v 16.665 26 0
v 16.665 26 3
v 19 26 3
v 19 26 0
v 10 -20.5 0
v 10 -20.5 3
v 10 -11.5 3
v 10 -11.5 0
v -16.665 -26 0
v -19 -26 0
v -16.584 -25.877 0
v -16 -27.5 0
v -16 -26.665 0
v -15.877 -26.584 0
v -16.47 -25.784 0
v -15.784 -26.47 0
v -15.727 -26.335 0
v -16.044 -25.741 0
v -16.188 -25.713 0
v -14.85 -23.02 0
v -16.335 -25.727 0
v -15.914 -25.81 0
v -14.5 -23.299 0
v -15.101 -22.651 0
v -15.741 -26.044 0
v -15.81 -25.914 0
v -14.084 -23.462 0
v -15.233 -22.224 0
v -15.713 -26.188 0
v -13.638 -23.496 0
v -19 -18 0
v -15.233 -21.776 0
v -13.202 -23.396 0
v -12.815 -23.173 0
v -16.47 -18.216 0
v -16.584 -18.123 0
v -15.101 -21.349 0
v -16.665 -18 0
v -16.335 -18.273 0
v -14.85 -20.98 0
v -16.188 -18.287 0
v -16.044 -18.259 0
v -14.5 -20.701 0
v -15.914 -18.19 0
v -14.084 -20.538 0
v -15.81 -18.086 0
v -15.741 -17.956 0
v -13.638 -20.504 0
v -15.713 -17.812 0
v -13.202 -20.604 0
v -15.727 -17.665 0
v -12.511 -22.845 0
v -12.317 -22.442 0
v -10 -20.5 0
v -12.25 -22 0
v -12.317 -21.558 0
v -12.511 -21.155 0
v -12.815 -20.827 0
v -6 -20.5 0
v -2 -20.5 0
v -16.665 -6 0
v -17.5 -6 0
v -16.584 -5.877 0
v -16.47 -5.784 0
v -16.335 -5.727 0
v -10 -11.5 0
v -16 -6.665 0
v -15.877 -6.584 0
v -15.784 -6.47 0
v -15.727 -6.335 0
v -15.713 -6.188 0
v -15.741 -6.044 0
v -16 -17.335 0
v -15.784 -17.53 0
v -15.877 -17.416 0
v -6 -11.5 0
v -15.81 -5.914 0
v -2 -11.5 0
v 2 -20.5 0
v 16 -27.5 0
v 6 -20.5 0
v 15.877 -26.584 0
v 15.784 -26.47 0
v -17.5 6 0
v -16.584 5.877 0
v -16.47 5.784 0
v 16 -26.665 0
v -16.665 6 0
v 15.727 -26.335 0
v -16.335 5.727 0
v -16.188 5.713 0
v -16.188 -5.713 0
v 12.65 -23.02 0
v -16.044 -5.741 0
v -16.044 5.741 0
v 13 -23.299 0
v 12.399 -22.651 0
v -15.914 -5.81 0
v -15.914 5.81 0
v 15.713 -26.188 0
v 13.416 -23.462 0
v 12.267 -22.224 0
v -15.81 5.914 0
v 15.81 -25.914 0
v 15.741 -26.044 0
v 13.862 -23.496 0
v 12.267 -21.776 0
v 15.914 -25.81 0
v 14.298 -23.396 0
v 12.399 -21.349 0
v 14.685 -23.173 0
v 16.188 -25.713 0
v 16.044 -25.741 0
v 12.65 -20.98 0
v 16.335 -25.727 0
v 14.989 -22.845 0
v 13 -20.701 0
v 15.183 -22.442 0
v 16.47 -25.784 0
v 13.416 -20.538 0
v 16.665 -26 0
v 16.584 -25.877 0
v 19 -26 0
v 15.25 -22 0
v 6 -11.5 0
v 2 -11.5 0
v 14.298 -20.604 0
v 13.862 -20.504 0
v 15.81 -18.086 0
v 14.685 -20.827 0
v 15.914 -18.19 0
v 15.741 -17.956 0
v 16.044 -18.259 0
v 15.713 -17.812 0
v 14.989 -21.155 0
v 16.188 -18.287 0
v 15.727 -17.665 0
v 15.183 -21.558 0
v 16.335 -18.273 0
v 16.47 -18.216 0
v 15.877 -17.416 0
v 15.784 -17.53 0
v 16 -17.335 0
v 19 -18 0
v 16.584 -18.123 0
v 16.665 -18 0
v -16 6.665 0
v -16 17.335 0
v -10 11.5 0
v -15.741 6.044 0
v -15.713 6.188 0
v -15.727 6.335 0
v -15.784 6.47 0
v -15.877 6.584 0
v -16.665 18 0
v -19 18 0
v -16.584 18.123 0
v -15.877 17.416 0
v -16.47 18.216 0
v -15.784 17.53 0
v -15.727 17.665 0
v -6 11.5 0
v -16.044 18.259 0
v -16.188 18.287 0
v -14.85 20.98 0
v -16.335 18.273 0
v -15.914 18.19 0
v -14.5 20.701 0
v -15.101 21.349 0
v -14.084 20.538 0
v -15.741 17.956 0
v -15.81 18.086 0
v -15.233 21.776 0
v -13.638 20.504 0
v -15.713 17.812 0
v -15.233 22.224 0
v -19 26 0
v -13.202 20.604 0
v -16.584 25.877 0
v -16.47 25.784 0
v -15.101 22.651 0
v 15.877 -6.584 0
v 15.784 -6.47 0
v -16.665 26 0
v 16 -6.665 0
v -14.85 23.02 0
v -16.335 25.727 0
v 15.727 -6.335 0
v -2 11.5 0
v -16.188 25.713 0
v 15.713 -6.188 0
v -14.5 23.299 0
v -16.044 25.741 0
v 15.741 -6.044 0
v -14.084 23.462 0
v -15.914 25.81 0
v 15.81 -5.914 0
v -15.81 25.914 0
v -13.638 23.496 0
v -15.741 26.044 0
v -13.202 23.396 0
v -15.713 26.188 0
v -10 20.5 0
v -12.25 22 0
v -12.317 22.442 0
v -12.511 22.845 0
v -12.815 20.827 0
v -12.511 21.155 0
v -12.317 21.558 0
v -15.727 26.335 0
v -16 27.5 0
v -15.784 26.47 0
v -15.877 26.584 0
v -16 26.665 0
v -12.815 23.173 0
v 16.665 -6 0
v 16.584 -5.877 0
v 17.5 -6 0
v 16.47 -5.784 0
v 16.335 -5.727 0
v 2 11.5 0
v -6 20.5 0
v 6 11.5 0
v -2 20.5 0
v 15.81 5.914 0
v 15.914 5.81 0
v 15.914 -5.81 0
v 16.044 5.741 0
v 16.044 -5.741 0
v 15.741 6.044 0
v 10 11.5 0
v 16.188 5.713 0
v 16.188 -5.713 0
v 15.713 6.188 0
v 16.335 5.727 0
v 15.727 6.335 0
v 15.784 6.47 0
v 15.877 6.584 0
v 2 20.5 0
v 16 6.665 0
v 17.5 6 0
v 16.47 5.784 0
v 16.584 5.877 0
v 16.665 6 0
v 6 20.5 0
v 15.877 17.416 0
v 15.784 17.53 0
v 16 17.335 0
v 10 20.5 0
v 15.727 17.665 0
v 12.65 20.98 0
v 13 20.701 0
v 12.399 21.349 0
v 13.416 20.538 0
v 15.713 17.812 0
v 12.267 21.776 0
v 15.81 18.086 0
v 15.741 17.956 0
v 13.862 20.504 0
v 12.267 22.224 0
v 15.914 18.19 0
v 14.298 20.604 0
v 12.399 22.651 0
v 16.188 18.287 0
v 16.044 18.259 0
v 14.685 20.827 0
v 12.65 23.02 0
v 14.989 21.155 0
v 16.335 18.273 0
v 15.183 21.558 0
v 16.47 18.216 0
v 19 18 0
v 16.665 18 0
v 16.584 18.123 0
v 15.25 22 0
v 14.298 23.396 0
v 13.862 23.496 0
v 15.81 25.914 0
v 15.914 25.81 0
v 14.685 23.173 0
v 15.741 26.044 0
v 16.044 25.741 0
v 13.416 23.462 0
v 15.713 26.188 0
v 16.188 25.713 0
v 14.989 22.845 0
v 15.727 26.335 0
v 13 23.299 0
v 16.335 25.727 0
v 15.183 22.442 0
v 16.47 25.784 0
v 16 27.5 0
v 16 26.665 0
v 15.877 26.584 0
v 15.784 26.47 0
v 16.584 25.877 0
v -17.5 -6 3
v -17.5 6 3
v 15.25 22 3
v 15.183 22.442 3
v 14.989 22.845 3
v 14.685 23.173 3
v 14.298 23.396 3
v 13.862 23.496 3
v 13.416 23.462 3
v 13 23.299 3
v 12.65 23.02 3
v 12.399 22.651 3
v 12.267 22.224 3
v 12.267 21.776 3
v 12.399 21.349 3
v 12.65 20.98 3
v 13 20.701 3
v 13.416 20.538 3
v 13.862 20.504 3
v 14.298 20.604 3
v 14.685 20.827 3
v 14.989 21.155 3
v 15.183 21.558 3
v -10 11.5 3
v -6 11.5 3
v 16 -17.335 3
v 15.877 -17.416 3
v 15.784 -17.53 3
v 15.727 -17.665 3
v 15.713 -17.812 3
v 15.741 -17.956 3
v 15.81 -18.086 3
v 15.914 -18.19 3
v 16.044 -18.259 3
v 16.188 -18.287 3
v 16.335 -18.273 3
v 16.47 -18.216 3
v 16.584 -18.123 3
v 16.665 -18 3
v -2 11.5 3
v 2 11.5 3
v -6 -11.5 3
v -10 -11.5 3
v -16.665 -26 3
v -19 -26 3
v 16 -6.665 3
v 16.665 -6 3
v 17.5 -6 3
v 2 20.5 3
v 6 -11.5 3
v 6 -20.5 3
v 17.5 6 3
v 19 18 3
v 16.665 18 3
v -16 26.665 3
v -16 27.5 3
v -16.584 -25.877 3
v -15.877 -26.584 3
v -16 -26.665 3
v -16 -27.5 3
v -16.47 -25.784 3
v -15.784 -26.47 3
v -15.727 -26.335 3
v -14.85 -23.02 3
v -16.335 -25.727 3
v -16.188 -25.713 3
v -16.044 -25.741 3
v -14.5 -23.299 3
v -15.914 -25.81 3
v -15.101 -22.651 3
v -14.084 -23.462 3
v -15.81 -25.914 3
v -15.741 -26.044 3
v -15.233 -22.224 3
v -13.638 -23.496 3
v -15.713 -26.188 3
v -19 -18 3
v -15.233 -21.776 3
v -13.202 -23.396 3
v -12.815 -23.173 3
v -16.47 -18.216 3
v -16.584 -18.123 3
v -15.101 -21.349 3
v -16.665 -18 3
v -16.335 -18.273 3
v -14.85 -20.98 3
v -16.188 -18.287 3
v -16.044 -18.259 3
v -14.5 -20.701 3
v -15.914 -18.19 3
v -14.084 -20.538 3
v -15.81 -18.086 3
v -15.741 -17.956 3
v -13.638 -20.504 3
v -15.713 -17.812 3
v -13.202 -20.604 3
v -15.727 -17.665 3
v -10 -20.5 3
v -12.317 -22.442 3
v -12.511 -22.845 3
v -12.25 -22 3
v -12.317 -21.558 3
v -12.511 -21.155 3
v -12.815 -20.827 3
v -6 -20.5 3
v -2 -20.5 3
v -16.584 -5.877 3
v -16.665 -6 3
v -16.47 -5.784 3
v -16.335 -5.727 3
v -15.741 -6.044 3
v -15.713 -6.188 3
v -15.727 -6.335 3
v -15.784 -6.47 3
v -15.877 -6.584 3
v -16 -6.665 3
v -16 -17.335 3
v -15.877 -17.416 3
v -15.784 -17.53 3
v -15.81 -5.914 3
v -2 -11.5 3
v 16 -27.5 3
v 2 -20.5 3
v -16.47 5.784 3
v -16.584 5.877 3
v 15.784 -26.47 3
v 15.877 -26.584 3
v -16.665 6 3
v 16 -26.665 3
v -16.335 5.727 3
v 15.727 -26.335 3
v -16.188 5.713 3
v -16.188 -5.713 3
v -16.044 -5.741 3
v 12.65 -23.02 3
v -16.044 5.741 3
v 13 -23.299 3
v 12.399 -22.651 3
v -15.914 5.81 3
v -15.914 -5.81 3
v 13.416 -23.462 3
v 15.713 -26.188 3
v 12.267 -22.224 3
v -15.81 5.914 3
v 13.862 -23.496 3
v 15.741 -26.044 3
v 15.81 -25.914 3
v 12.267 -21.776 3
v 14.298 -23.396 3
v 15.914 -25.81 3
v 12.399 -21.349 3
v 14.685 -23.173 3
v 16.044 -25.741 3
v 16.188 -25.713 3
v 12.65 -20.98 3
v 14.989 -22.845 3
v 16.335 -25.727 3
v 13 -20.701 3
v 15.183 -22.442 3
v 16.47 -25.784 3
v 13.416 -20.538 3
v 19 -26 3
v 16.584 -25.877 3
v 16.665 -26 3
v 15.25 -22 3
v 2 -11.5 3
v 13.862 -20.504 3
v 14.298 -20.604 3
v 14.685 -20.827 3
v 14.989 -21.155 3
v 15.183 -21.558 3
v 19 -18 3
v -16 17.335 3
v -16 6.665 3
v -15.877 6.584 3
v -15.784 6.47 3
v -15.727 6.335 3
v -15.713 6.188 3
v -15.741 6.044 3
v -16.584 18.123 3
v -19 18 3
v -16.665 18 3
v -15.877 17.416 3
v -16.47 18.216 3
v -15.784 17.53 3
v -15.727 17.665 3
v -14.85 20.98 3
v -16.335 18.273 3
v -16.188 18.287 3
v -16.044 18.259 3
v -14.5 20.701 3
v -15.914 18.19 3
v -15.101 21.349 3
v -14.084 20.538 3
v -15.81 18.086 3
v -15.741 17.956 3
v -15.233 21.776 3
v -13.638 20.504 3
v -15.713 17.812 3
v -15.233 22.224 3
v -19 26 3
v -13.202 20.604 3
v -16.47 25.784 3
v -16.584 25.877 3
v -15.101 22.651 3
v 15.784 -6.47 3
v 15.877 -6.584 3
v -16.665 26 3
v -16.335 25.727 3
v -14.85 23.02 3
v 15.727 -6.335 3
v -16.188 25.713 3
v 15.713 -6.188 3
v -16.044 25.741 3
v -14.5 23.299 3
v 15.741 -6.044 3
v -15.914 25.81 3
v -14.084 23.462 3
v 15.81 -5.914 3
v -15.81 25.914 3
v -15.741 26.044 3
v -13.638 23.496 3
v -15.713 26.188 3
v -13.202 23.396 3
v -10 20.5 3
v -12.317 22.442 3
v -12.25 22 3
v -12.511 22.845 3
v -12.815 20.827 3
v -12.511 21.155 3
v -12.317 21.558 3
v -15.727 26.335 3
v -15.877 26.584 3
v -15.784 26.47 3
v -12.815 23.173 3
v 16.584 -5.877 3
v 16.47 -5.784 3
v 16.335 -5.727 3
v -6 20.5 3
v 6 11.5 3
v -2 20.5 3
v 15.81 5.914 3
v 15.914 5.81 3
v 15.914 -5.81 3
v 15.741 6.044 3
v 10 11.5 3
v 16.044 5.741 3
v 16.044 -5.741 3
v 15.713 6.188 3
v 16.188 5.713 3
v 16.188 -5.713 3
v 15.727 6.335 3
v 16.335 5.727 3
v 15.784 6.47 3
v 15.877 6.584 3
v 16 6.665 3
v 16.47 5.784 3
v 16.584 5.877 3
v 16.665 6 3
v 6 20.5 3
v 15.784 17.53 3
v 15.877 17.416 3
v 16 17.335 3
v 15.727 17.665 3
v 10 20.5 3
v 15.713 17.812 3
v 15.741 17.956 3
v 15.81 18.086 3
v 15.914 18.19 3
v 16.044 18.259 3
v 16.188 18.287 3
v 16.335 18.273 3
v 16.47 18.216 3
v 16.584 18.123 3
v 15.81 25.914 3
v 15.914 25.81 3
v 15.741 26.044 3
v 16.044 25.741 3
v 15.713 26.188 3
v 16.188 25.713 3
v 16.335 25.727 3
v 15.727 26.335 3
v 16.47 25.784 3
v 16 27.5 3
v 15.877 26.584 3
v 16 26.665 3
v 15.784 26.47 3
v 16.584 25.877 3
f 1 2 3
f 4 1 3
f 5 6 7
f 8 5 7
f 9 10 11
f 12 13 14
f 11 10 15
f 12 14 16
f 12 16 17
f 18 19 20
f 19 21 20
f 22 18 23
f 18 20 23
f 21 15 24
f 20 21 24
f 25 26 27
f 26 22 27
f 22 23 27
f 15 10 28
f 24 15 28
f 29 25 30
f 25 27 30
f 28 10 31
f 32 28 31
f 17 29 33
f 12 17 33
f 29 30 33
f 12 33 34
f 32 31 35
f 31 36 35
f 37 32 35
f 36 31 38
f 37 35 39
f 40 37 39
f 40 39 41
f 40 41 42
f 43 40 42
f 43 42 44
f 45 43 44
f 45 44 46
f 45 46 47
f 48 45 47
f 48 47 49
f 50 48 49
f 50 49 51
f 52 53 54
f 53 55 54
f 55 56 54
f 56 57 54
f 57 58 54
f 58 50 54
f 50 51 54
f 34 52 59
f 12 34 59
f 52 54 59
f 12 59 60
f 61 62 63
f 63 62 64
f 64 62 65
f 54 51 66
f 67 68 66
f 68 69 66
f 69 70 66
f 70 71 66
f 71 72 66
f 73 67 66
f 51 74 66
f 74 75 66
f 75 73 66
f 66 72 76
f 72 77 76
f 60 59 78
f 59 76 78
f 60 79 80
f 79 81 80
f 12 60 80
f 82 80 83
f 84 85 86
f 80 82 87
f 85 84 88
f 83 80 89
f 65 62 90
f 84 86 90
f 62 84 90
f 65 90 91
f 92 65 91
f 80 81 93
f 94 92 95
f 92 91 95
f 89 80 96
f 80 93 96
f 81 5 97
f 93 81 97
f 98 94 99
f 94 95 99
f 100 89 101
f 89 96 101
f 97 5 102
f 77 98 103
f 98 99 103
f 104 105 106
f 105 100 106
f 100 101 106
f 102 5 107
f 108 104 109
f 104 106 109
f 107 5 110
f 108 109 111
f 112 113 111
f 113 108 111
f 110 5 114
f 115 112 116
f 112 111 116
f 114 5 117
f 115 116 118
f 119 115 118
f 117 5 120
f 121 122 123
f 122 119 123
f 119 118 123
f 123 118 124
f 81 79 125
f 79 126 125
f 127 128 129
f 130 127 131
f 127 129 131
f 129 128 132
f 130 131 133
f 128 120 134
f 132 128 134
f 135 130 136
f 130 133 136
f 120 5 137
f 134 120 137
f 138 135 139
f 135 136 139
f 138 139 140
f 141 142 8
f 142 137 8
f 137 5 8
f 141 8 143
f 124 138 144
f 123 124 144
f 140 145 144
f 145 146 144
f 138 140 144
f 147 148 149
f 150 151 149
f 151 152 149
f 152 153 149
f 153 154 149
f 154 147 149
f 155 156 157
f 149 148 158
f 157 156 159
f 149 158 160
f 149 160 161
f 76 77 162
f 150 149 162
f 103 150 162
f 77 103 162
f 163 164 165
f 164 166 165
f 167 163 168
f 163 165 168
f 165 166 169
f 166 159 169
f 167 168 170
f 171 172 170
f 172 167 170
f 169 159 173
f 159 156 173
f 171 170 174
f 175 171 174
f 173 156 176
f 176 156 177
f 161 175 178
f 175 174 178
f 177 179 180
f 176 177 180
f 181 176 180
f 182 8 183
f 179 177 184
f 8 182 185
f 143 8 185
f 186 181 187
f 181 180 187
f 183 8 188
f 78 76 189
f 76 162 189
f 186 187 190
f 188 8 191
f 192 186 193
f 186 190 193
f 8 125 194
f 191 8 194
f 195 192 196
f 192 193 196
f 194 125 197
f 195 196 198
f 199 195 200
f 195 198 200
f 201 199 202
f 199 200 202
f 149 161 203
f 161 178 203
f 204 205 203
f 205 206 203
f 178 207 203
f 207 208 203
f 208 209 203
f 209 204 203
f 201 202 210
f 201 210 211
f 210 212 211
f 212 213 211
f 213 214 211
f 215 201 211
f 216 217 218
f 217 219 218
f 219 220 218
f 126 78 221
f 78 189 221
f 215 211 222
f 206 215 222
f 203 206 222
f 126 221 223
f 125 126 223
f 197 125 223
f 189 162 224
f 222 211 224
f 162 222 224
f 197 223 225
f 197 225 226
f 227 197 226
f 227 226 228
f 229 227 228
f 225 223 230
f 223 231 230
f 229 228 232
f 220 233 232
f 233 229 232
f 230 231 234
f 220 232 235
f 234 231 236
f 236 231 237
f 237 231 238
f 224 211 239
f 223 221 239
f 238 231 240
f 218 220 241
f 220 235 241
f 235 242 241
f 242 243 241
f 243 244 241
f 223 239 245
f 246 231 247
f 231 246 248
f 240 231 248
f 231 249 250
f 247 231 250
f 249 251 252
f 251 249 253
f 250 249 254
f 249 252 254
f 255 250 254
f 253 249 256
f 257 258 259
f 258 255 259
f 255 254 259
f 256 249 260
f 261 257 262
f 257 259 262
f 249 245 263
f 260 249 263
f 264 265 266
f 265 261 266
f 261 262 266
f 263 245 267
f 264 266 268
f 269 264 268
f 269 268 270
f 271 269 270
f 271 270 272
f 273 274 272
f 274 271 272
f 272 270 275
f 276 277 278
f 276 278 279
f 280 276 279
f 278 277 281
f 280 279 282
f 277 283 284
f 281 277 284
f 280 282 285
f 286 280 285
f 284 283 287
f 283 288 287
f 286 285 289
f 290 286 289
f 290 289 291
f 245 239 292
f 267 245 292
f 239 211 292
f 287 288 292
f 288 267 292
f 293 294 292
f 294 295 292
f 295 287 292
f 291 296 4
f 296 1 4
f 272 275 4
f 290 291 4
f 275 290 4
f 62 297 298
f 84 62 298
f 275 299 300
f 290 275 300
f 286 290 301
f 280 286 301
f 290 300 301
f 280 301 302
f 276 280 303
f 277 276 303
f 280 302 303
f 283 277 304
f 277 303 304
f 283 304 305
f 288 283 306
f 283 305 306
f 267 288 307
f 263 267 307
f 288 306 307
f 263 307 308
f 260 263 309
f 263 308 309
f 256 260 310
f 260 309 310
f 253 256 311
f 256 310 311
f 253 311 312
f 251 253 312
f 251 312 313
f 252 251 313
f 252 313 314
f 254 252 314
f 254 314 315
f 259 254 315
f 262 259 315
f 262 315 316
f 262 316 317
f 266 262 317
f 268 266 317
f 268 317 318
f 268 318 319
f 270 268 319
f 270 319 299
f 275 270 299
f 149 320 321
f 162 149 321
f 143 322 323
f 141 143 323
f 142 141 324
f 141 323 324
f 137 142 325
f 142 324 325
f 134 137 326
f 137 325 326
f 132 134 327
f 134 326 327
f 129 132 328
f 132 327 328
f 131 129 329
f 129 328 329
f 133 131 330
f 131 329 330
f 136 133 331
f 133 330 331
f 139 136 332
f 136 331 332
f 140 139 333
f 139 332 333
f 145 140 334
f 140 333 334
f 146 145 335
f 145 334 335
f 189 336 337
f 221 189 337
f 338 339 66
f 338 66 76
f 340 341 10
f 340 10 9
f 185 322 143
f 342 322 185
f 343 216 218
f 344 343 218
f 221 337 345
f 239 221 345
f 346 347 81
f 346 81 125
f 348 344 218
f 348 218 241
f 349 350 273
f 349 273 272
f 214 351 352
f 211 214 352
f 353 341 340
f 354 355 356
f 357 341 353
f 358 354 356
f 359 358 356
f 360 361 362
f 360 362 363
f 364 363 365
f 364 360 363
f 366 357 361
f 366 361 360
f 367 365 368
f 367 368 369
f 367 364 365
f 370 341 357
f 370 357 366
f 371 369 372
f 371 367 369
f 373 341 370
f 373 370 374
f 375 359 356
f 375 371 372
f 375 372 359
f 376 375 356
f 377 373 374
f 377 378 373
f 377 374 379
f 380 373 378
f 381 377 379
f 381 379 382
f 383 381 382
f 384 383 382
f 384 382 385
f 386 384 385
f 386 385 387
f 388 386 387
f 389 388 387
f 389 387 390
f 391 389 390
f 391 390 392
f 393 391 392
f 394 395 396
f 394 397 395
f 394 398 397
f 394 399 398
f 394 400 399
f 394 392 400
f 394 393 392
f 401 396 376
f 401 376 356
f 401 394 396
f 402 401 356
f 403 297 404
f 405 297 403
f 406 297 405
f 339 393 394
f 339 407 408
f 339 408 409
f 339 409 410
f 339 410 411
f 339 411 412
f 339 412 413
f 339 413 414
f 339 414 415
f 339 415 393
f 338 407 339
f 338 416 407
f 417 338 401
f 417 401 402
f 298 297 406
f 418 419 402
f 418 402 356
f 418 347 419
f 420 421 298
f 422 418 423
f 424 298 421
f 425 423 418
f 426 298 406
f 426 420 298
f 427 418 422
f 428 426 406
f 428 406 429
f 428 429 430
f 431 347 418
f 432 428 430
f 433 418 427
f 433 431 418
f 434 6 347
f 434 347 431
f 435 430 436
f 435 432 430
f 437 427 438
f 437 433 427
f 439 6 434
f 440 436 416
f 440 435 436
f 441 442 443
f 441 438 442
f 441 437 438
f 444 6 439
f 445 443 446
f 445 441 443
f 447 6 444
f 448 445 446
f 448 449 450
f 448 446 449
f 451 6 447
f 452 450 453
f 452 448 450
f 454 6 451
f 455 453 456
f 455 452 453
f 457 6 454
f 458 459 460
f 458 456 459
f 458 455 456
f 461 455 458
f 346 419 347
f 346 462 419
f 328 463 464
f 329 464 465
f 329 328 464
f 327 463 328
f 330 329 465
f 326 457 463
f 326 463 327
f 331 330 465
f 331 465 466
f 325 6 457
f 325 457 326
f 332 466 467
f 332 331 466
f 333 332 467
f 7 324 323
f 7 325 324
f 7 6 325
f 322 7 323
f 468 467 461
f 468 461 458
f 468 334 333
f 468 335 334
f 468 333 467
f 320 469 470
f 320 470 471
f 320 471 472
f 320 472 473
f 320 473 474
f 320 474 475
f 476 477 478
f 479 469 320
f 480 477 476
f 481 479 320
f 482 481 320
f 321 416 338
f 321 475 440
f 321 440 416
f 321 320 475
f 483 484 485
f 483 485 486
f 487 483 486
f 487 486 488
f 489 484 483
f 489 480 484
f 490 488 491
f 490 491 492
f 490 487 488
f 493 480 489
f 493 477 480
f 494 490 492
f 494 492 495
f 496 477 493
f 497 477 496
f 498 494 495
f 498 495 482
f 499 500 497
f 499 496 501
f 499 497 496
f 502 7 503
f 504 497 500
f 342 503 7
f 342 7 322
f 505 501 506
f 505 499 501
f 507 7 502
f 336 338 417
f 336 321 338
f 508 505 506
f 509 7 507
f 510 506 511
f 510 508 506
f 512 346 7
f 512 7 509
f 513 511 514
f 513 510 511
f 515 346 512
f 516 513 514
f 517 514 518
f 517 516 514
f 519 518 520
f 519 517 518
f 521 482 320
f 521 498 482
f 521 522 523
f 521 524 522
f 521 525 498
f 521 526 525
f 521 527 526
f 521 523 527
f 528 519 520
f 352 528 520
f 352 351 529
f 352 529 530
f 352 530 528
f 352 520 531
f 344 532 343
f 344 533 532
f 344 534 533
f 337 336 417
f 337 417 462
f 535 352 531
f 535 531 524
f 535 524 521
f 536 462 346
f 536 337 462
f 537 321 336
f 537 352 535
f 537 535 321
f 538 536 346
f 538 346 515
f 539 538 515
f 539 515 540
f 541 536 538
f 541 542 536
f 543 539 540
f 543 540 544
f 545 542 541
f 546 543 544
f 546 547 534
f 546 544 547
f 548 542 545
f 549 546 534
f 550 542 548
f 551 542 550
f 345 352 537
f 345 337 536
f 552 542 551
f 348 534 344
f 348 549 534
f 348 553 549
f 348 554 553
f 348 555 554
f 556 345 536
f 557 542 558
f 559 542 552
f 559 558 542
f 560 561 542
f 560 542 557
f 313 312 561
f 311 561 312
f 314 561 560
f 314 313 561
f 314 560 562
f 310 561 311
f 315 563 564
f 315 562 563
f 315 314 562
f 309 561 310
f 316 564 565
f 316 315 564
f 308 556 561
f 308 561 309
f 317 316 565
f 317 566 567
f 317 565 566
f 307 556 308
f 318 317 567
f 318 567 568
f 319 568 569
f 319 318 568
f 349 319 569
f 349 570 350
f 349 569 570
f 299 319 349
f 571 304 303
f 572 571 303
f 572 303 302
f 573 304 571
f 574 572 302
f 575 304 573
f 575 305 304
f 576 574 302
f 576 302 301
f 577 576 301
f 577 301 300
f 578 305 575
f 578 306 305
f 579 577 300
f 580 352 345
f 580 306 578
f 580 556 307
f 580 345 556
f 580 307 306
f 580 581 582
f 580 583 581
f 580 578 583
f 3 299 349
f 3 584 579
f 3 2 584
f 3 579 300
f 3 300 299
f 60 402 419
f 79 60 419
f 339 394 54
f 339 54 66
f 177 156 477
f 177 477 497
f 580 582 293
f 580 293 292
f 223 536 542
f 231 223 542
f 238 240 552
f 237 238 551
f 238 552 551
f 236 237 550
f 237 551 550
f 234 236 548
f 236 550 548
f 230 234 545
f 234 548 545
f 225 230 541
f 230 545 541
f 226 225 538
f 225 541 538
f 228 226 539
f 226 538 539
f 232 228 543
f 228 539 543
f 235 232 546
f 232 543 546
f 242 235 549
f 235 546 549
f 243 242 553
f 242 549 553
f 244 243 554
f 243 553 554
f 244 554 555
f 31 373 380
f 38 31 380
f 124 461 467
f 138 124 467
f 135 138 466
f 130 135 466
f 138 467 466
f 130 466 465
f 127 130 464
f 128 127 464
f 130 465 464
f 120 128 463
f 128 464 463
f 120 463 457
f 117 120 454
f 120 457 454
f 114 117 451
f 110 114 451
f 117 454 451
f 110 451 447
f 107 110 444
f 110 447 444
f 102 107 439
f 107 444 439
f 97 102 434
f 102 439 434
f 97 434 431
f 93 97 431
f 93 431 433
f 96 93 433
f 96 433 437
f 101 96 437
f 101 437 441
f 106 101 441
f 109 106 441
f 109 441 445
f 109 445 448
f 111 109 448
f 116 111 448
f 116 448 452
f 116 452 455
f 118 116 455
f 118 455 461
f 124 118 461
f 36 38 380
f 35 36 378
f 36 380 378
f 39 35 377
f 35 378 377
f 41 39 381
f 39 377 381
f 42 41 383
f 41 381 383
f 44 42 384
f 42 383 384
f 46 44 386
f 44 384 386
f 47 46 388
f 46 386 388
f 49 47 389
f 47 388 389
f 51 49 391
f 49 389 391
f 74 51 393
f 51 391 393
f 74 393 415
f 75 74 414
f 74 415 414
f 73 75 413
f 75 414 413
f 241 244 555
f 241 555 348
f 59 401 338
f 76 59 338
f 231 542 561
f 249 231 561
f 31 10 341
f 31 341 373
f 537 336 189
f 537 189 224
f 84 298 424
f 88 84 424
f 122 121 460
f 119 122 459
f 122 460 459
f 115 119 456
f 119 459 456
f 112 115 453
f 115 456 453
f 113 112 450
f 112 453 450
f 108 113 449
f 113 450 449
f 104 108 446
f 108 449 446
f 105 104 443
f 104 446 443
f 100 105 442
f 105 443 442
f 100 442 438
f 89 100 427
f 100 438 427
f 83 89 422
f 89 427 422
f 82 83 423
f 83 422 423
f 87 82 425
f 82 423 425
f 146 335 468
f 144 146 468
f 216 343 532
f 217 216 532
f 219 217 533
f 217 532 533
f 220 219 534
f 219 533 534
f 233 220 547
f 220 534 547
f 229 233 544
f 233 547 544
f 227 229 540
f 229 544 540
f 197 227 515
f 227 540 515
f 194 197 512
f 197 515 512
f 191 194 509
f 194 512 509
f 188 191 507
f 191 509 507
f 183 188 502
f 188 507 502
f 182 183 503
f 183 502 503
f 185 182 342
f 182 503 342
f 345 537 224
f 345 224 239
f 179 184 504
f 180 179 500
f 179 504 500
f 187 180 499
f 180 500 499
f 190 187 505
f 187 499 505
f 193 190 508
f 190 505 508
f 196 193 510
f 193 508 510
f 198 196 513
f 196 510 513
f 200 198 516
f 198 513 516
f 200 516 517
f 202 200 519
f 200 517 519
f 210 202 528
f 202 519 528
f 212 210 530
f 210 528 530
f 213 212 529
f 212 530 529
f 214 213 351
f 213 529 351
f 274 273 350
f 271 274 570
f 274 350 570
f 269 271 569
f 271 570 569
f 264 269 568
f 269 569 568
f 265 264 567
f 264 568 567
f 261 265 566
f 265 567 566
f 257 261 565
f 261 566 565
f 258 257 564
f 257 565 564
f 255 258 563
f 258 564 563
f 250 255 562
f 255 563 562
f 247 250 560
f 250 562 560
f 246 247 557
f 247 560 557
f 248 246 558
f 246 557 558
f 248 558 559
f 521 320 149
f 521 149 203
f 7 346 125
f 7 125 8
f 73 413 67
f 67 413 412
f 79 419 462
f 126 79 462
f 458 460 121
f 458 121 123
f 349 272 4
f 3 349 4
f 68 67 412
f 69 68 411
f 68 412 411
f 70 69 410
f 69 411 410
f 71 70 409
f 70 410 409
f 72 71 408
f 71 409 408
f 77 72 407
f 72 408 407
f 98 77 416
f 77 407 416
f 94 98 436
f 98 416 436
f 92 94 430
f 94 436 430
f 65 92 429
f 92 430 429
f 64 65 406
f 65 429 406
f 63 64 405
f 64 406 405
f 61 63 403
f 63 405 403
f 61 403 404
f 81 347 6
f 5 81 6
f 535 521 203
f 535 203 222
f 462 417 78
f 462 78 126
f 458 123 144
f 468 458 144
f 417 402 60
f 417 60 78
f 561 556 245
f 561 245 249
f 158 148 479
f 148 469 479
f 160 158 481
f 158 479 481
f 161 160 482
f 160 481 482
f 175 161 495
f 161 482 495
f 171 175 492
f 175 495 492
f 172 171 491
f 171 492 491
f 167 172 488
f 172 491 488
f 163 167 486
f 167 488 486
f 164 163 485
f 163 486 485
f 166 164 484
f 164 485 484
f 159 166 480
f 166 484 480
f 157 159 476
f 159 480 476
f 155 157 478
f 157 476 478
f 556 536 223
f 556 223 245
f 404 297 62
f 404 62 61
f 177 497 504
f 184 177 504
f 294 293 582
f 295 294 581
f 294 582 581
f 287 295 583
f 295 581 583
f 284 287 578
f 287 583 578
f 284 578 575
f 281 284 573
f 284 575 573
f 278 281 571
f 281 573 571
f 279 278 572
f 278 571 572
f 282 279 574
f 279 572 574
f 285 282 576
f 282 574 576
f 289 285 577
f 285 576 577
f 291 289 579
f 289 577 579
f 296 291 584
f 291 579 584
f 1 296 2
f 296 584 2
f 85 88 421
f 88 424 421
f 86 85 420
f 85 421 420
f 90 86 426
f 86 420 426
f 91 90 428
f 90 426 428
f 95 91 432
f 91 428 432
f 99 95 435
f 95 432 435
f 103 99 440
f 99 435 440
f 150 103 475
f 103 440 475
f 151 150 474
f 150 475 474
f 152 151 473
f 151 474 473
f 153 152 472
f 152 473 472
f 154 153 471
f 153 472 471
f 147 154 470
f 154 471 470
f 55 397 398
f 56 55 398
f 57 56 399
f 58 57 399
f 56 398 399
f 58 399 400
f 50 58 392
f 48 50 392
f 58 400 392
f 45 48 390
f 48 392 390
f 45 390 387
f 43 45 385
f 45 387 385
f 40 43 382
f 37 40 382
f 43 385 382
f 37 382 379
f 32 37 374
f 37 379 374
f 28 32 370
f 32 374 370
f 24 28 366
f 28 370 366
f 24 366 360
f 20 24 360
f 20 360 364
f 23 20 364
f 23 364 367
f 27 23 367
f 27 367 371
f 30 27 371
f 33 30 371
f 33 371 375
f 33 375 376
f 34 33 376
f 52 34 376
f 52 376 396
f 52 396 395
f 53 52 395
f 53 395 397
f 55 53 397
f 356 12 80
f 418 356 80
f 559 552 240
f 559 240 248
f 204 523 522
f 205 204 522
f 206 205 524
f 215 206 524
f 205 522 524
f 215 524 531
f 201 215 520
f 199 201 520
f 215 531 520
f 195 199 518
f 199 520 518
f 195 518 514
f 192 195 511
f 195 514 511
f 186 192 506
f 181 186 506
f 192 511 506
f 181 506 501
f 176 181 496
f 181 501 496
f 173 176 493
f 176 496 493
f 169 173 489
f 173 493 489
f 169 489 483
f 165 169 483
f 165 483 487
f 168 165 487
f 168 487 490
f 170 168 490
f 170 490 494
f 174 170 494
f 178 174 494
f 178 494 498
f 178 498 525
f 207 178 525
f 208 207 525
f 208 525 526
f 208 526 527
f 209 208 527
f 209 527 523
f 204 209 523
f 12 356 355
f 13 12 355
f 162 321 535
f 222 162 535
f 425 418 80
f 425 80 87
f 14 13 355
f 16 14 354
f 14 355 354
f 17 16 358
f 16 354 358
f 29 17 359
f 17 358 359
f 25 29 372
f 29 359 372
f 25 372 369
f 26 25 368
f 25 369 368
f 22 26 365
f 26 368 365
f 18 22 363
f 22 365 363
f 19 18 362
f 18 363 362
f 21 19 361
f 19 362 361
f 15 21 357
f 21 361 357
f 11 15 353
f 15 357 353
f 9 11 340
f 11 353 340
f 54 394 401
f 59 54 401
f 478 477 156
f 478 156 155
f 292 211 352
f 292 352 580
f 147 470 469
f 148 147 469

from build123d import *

# Parameters (mm, degrees)
SKETCH_1_W          = 38
SKETCH_1_H          = 55
EXTRUDE_1_DEPTH     = 3
SKETCH_2_W          = 3
SKETCH_2_H          = 36
SKETCH_2_H_2        = 1.5
CUT_EXTRUDE_1_DEPTH = 3
SKETCH_3_R          = 1.5
CUT_EXTRUDE_2_DEPTH = 4
SKETCH_4_W          = 4
SKETCH_4_H          = 9
CUT_EXTRUDE_3_DEPTH = 10
SKETCH_5_W          = 1.5
SKETCH_5_H          = 12
EXTRUDE_2_DEPTH     = 3
SKETCH_6_R          = 0.5
CUT_EXTRUDE_4_DEPTH = 10


with BuildPart() as part:
    # 草图1 → 凸台-拉伸1 (new body)
    with BuildSketch(Plane.XY):
        Rectangle(SKETCH_1_W, SKETCH_1_H)
    extrude(amount=EXTRUDE_1_DEPTH)

    # 草图2 → 切除-拉伸1 (cut)
    with BuildSketch(Plane.XY.offset(3)):
        with Locations((-17.5, 0)):
            Rectangle(SKETCH_2_W, SKETCH_2_H)
        with Locations((-17.5, 26.75)):
            Rectangle(SKETCH_2_W, SKETCH_2_H_2)
        with Locations((17.5, -26.75)):
            Rectangle(SKETCH_2_W, SKETCH_2_H_2)
        with Locations((17.5, 0)):
            Rectangle(SKETCH_2_W, SKETCH_2_H)
        with Locations((17.5, 26.75)):
            Rectangle(SKETCH_2_W, SKETCH_2_H_2)
        with Locations((-17.5, -26.75)):
            Rectangle(SKETCH_2_W, SKETCH_2_H_2)
    extrude(amount=-CUT_EXTRUDE_1_DEPTH, mode=Mode.SUBTRACT)

    # 草图3 → 切除-拉伸2 (cut, through all)
    with BuildSketch(Plane.XY.offset(3)):
        with Locations((-13.75, -22)):
            Circle(SKETCH_3_R)
        with Locations((13.75, -22)):
            Circle(SKETCH_3_R)
        with Locations((13.75, 22)):
            Circle(SKETCH_3_R)
        with Locations((-13.75, 22)):
            Circle(SKETCH_3_R)
    extrude(amount=-CUT_EXTRUDE_2_DEPTH, mode=Mode.SUBTRACT)

    # 草图4 → 切除-拉伸3 (cut)
    with BuildSketch(Plane.XY.offset(3)):
        with Locations((8, -16)):
            Rectangle(SKETCH_4_W, SKETCH_4_H)
        with Locations((0, -16)):
            Rectangle(SKETCH_4_W, SKETCH_4_H)
        with Locations((-8, -16)):
            Rectangle(SKETCH_4_W, SKETCH_4_H)
        with Locations((-8, 16)):
            Rectangle(SKETCH_4_W, SKETCH_4_H)
        with Locations((8, 16)):
            Rectangle(SKETCH_4_W, SKETCH_4_H)
        with Locations((0, 16)):
            Rectangle(SKETCH_4_W, SKETCH_4_H)
    extrude(amount=-CUT_EXTRUDE_3_DEPTH, mode=Mode.SUBTRACT)

    # 草图5 → 凸台-拉伸2 (add, through all)
    with BuildSketch(Plane.XY.offset(3)):
        with Locations((-16.75, 0)):
            Rectangle(SKETCH_5_W, SKETCH_5_H)
        with Locations((16.75, 0)):
            Rectangle(SKETCH_5_W, SKETCH_5_H)
    extrude(amount=-EXTRUDE_2_DEPTH)

    # 草图6 → 切除-拉伸4 (cut)
    with BuildSketch(Plane.XY.offset(3)):
        with Locations((-16.212132034, -26.212132034)):
            Circle(SKETCH_6_R)
        with Locations((-16.212132034, -17.787867966)):
            Circle(SKETCH_6_R)
        with Locations((-16.212132034, -6.212132034)):
            Circle(SKETCH_6_R)
        with Locations((16.212132034, -6.212132034)):
            Circle(SKETCH_6_R)
        with Locations((16.212132034, -17.787867966)):
            Circle(SKETCH_6_R)
        with Locations((16.212132034, -26.212132034)):
            Circle(SKETCH_6_R)
        with Locations((16.212132034, 26.212132034)):
            Circle(SKETCH_6_R)
        with Locations((16.212132034, 17.787867966)):
            Circle(SKETCH_6_R)
        with Locations((16.212132034, 6.212132034)):
            Circle(SKETCH_6_R)
        with Locations((-16.212132034, 6.212132034)):
            Circle(SKETCH_6_R)
        with Locations((-16.212132034, 17.787867966)):
            Circle(SKETCH_6_R)
        with Locations((-16.212132034, 26.212132034)):
            Circle(SKETCH_6_R)
    extrude(amount=-CUT_EXTRUDE_4_DEPTH, mode=Mode.SUBTRACT)


solid = part.part
